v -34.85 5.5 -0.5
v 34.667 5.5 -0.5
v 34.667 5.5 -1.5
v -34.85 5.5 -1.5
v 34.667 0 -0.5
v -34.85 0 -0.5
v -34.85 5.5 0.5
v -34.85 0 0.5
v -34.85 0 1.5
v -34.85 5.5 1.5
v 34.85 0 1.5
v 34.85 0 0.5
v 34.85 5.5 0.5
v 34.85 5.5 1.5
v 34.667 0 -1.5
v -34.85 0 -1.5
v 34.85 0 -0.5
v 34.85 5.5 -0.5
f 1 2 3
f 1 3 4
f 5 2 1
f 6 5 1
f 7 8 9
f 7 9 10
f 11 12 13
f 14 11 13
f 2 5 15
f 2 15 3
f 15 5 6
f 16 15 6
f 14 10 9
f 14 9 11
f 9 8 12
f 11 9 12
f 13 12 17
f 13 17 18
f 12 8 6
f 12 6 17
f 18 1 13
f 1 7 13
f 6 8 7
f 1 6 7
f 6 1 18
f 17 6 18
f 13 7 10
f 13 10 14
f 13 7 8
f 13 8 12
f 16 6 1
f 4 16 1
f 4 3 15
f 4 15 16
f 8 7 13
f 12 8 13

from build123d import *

# Parameters (mm, degrees)
SKETCH1_W           = 69.7
SKETCH1_H           = 5.5
BOSS_EXTRUDE1_DEPTH = 0.5
SKETCH2_W           = 69.7
SKETCH2_H           = 5.5
BOSS_EXTRUDE2_DEPTH = 1
SKETCH3_W           = 69.517480874
SKETCH3_H           = 5.5
BOSS_EXTRUDE3_DEPTH = 1


with BuildPart() as part:
    # Sketch1 → Boss-Extrude1 (new body, symmetric)
    with BuildSketch(Plane.XY):
        with Locations((0, 2.75)):
            Rectangle(SKETCH1_W, SKETCH1_H)
    extrude(amount=BOSS_EXTRUDE1_DEPTH, both=True)


with BuildPart() as body_2:
    # Sketch2 → Boss-Extrude2 (new body)
    with BuildSketch(Plane.XY.offset(0.5)):
        with Locations((0, 2.75)):
            Rectangle(SKETCH2_W, SKETCH2_H)
    extrude(amount=BOSS_EXTRUDE2_DEPTH)


with BuildPart() as body_3:
    # Sketch3 → Boss-Extrude3 (new body)
    with BuildSketch(Plane(origin=(0, 0, -0.5), x_dir=(-1, 0, 0), z_dir=(0, 0, -1))):
        with Locations((0.091259563, 2.75)):
            Rectangle(SKETCH3_W, SKETCH3_H)
    extrude(amount=BOSS_EXTRUDE3_DEPTH)


solid = Compound([part.part, body_2.part, body_3.part])
